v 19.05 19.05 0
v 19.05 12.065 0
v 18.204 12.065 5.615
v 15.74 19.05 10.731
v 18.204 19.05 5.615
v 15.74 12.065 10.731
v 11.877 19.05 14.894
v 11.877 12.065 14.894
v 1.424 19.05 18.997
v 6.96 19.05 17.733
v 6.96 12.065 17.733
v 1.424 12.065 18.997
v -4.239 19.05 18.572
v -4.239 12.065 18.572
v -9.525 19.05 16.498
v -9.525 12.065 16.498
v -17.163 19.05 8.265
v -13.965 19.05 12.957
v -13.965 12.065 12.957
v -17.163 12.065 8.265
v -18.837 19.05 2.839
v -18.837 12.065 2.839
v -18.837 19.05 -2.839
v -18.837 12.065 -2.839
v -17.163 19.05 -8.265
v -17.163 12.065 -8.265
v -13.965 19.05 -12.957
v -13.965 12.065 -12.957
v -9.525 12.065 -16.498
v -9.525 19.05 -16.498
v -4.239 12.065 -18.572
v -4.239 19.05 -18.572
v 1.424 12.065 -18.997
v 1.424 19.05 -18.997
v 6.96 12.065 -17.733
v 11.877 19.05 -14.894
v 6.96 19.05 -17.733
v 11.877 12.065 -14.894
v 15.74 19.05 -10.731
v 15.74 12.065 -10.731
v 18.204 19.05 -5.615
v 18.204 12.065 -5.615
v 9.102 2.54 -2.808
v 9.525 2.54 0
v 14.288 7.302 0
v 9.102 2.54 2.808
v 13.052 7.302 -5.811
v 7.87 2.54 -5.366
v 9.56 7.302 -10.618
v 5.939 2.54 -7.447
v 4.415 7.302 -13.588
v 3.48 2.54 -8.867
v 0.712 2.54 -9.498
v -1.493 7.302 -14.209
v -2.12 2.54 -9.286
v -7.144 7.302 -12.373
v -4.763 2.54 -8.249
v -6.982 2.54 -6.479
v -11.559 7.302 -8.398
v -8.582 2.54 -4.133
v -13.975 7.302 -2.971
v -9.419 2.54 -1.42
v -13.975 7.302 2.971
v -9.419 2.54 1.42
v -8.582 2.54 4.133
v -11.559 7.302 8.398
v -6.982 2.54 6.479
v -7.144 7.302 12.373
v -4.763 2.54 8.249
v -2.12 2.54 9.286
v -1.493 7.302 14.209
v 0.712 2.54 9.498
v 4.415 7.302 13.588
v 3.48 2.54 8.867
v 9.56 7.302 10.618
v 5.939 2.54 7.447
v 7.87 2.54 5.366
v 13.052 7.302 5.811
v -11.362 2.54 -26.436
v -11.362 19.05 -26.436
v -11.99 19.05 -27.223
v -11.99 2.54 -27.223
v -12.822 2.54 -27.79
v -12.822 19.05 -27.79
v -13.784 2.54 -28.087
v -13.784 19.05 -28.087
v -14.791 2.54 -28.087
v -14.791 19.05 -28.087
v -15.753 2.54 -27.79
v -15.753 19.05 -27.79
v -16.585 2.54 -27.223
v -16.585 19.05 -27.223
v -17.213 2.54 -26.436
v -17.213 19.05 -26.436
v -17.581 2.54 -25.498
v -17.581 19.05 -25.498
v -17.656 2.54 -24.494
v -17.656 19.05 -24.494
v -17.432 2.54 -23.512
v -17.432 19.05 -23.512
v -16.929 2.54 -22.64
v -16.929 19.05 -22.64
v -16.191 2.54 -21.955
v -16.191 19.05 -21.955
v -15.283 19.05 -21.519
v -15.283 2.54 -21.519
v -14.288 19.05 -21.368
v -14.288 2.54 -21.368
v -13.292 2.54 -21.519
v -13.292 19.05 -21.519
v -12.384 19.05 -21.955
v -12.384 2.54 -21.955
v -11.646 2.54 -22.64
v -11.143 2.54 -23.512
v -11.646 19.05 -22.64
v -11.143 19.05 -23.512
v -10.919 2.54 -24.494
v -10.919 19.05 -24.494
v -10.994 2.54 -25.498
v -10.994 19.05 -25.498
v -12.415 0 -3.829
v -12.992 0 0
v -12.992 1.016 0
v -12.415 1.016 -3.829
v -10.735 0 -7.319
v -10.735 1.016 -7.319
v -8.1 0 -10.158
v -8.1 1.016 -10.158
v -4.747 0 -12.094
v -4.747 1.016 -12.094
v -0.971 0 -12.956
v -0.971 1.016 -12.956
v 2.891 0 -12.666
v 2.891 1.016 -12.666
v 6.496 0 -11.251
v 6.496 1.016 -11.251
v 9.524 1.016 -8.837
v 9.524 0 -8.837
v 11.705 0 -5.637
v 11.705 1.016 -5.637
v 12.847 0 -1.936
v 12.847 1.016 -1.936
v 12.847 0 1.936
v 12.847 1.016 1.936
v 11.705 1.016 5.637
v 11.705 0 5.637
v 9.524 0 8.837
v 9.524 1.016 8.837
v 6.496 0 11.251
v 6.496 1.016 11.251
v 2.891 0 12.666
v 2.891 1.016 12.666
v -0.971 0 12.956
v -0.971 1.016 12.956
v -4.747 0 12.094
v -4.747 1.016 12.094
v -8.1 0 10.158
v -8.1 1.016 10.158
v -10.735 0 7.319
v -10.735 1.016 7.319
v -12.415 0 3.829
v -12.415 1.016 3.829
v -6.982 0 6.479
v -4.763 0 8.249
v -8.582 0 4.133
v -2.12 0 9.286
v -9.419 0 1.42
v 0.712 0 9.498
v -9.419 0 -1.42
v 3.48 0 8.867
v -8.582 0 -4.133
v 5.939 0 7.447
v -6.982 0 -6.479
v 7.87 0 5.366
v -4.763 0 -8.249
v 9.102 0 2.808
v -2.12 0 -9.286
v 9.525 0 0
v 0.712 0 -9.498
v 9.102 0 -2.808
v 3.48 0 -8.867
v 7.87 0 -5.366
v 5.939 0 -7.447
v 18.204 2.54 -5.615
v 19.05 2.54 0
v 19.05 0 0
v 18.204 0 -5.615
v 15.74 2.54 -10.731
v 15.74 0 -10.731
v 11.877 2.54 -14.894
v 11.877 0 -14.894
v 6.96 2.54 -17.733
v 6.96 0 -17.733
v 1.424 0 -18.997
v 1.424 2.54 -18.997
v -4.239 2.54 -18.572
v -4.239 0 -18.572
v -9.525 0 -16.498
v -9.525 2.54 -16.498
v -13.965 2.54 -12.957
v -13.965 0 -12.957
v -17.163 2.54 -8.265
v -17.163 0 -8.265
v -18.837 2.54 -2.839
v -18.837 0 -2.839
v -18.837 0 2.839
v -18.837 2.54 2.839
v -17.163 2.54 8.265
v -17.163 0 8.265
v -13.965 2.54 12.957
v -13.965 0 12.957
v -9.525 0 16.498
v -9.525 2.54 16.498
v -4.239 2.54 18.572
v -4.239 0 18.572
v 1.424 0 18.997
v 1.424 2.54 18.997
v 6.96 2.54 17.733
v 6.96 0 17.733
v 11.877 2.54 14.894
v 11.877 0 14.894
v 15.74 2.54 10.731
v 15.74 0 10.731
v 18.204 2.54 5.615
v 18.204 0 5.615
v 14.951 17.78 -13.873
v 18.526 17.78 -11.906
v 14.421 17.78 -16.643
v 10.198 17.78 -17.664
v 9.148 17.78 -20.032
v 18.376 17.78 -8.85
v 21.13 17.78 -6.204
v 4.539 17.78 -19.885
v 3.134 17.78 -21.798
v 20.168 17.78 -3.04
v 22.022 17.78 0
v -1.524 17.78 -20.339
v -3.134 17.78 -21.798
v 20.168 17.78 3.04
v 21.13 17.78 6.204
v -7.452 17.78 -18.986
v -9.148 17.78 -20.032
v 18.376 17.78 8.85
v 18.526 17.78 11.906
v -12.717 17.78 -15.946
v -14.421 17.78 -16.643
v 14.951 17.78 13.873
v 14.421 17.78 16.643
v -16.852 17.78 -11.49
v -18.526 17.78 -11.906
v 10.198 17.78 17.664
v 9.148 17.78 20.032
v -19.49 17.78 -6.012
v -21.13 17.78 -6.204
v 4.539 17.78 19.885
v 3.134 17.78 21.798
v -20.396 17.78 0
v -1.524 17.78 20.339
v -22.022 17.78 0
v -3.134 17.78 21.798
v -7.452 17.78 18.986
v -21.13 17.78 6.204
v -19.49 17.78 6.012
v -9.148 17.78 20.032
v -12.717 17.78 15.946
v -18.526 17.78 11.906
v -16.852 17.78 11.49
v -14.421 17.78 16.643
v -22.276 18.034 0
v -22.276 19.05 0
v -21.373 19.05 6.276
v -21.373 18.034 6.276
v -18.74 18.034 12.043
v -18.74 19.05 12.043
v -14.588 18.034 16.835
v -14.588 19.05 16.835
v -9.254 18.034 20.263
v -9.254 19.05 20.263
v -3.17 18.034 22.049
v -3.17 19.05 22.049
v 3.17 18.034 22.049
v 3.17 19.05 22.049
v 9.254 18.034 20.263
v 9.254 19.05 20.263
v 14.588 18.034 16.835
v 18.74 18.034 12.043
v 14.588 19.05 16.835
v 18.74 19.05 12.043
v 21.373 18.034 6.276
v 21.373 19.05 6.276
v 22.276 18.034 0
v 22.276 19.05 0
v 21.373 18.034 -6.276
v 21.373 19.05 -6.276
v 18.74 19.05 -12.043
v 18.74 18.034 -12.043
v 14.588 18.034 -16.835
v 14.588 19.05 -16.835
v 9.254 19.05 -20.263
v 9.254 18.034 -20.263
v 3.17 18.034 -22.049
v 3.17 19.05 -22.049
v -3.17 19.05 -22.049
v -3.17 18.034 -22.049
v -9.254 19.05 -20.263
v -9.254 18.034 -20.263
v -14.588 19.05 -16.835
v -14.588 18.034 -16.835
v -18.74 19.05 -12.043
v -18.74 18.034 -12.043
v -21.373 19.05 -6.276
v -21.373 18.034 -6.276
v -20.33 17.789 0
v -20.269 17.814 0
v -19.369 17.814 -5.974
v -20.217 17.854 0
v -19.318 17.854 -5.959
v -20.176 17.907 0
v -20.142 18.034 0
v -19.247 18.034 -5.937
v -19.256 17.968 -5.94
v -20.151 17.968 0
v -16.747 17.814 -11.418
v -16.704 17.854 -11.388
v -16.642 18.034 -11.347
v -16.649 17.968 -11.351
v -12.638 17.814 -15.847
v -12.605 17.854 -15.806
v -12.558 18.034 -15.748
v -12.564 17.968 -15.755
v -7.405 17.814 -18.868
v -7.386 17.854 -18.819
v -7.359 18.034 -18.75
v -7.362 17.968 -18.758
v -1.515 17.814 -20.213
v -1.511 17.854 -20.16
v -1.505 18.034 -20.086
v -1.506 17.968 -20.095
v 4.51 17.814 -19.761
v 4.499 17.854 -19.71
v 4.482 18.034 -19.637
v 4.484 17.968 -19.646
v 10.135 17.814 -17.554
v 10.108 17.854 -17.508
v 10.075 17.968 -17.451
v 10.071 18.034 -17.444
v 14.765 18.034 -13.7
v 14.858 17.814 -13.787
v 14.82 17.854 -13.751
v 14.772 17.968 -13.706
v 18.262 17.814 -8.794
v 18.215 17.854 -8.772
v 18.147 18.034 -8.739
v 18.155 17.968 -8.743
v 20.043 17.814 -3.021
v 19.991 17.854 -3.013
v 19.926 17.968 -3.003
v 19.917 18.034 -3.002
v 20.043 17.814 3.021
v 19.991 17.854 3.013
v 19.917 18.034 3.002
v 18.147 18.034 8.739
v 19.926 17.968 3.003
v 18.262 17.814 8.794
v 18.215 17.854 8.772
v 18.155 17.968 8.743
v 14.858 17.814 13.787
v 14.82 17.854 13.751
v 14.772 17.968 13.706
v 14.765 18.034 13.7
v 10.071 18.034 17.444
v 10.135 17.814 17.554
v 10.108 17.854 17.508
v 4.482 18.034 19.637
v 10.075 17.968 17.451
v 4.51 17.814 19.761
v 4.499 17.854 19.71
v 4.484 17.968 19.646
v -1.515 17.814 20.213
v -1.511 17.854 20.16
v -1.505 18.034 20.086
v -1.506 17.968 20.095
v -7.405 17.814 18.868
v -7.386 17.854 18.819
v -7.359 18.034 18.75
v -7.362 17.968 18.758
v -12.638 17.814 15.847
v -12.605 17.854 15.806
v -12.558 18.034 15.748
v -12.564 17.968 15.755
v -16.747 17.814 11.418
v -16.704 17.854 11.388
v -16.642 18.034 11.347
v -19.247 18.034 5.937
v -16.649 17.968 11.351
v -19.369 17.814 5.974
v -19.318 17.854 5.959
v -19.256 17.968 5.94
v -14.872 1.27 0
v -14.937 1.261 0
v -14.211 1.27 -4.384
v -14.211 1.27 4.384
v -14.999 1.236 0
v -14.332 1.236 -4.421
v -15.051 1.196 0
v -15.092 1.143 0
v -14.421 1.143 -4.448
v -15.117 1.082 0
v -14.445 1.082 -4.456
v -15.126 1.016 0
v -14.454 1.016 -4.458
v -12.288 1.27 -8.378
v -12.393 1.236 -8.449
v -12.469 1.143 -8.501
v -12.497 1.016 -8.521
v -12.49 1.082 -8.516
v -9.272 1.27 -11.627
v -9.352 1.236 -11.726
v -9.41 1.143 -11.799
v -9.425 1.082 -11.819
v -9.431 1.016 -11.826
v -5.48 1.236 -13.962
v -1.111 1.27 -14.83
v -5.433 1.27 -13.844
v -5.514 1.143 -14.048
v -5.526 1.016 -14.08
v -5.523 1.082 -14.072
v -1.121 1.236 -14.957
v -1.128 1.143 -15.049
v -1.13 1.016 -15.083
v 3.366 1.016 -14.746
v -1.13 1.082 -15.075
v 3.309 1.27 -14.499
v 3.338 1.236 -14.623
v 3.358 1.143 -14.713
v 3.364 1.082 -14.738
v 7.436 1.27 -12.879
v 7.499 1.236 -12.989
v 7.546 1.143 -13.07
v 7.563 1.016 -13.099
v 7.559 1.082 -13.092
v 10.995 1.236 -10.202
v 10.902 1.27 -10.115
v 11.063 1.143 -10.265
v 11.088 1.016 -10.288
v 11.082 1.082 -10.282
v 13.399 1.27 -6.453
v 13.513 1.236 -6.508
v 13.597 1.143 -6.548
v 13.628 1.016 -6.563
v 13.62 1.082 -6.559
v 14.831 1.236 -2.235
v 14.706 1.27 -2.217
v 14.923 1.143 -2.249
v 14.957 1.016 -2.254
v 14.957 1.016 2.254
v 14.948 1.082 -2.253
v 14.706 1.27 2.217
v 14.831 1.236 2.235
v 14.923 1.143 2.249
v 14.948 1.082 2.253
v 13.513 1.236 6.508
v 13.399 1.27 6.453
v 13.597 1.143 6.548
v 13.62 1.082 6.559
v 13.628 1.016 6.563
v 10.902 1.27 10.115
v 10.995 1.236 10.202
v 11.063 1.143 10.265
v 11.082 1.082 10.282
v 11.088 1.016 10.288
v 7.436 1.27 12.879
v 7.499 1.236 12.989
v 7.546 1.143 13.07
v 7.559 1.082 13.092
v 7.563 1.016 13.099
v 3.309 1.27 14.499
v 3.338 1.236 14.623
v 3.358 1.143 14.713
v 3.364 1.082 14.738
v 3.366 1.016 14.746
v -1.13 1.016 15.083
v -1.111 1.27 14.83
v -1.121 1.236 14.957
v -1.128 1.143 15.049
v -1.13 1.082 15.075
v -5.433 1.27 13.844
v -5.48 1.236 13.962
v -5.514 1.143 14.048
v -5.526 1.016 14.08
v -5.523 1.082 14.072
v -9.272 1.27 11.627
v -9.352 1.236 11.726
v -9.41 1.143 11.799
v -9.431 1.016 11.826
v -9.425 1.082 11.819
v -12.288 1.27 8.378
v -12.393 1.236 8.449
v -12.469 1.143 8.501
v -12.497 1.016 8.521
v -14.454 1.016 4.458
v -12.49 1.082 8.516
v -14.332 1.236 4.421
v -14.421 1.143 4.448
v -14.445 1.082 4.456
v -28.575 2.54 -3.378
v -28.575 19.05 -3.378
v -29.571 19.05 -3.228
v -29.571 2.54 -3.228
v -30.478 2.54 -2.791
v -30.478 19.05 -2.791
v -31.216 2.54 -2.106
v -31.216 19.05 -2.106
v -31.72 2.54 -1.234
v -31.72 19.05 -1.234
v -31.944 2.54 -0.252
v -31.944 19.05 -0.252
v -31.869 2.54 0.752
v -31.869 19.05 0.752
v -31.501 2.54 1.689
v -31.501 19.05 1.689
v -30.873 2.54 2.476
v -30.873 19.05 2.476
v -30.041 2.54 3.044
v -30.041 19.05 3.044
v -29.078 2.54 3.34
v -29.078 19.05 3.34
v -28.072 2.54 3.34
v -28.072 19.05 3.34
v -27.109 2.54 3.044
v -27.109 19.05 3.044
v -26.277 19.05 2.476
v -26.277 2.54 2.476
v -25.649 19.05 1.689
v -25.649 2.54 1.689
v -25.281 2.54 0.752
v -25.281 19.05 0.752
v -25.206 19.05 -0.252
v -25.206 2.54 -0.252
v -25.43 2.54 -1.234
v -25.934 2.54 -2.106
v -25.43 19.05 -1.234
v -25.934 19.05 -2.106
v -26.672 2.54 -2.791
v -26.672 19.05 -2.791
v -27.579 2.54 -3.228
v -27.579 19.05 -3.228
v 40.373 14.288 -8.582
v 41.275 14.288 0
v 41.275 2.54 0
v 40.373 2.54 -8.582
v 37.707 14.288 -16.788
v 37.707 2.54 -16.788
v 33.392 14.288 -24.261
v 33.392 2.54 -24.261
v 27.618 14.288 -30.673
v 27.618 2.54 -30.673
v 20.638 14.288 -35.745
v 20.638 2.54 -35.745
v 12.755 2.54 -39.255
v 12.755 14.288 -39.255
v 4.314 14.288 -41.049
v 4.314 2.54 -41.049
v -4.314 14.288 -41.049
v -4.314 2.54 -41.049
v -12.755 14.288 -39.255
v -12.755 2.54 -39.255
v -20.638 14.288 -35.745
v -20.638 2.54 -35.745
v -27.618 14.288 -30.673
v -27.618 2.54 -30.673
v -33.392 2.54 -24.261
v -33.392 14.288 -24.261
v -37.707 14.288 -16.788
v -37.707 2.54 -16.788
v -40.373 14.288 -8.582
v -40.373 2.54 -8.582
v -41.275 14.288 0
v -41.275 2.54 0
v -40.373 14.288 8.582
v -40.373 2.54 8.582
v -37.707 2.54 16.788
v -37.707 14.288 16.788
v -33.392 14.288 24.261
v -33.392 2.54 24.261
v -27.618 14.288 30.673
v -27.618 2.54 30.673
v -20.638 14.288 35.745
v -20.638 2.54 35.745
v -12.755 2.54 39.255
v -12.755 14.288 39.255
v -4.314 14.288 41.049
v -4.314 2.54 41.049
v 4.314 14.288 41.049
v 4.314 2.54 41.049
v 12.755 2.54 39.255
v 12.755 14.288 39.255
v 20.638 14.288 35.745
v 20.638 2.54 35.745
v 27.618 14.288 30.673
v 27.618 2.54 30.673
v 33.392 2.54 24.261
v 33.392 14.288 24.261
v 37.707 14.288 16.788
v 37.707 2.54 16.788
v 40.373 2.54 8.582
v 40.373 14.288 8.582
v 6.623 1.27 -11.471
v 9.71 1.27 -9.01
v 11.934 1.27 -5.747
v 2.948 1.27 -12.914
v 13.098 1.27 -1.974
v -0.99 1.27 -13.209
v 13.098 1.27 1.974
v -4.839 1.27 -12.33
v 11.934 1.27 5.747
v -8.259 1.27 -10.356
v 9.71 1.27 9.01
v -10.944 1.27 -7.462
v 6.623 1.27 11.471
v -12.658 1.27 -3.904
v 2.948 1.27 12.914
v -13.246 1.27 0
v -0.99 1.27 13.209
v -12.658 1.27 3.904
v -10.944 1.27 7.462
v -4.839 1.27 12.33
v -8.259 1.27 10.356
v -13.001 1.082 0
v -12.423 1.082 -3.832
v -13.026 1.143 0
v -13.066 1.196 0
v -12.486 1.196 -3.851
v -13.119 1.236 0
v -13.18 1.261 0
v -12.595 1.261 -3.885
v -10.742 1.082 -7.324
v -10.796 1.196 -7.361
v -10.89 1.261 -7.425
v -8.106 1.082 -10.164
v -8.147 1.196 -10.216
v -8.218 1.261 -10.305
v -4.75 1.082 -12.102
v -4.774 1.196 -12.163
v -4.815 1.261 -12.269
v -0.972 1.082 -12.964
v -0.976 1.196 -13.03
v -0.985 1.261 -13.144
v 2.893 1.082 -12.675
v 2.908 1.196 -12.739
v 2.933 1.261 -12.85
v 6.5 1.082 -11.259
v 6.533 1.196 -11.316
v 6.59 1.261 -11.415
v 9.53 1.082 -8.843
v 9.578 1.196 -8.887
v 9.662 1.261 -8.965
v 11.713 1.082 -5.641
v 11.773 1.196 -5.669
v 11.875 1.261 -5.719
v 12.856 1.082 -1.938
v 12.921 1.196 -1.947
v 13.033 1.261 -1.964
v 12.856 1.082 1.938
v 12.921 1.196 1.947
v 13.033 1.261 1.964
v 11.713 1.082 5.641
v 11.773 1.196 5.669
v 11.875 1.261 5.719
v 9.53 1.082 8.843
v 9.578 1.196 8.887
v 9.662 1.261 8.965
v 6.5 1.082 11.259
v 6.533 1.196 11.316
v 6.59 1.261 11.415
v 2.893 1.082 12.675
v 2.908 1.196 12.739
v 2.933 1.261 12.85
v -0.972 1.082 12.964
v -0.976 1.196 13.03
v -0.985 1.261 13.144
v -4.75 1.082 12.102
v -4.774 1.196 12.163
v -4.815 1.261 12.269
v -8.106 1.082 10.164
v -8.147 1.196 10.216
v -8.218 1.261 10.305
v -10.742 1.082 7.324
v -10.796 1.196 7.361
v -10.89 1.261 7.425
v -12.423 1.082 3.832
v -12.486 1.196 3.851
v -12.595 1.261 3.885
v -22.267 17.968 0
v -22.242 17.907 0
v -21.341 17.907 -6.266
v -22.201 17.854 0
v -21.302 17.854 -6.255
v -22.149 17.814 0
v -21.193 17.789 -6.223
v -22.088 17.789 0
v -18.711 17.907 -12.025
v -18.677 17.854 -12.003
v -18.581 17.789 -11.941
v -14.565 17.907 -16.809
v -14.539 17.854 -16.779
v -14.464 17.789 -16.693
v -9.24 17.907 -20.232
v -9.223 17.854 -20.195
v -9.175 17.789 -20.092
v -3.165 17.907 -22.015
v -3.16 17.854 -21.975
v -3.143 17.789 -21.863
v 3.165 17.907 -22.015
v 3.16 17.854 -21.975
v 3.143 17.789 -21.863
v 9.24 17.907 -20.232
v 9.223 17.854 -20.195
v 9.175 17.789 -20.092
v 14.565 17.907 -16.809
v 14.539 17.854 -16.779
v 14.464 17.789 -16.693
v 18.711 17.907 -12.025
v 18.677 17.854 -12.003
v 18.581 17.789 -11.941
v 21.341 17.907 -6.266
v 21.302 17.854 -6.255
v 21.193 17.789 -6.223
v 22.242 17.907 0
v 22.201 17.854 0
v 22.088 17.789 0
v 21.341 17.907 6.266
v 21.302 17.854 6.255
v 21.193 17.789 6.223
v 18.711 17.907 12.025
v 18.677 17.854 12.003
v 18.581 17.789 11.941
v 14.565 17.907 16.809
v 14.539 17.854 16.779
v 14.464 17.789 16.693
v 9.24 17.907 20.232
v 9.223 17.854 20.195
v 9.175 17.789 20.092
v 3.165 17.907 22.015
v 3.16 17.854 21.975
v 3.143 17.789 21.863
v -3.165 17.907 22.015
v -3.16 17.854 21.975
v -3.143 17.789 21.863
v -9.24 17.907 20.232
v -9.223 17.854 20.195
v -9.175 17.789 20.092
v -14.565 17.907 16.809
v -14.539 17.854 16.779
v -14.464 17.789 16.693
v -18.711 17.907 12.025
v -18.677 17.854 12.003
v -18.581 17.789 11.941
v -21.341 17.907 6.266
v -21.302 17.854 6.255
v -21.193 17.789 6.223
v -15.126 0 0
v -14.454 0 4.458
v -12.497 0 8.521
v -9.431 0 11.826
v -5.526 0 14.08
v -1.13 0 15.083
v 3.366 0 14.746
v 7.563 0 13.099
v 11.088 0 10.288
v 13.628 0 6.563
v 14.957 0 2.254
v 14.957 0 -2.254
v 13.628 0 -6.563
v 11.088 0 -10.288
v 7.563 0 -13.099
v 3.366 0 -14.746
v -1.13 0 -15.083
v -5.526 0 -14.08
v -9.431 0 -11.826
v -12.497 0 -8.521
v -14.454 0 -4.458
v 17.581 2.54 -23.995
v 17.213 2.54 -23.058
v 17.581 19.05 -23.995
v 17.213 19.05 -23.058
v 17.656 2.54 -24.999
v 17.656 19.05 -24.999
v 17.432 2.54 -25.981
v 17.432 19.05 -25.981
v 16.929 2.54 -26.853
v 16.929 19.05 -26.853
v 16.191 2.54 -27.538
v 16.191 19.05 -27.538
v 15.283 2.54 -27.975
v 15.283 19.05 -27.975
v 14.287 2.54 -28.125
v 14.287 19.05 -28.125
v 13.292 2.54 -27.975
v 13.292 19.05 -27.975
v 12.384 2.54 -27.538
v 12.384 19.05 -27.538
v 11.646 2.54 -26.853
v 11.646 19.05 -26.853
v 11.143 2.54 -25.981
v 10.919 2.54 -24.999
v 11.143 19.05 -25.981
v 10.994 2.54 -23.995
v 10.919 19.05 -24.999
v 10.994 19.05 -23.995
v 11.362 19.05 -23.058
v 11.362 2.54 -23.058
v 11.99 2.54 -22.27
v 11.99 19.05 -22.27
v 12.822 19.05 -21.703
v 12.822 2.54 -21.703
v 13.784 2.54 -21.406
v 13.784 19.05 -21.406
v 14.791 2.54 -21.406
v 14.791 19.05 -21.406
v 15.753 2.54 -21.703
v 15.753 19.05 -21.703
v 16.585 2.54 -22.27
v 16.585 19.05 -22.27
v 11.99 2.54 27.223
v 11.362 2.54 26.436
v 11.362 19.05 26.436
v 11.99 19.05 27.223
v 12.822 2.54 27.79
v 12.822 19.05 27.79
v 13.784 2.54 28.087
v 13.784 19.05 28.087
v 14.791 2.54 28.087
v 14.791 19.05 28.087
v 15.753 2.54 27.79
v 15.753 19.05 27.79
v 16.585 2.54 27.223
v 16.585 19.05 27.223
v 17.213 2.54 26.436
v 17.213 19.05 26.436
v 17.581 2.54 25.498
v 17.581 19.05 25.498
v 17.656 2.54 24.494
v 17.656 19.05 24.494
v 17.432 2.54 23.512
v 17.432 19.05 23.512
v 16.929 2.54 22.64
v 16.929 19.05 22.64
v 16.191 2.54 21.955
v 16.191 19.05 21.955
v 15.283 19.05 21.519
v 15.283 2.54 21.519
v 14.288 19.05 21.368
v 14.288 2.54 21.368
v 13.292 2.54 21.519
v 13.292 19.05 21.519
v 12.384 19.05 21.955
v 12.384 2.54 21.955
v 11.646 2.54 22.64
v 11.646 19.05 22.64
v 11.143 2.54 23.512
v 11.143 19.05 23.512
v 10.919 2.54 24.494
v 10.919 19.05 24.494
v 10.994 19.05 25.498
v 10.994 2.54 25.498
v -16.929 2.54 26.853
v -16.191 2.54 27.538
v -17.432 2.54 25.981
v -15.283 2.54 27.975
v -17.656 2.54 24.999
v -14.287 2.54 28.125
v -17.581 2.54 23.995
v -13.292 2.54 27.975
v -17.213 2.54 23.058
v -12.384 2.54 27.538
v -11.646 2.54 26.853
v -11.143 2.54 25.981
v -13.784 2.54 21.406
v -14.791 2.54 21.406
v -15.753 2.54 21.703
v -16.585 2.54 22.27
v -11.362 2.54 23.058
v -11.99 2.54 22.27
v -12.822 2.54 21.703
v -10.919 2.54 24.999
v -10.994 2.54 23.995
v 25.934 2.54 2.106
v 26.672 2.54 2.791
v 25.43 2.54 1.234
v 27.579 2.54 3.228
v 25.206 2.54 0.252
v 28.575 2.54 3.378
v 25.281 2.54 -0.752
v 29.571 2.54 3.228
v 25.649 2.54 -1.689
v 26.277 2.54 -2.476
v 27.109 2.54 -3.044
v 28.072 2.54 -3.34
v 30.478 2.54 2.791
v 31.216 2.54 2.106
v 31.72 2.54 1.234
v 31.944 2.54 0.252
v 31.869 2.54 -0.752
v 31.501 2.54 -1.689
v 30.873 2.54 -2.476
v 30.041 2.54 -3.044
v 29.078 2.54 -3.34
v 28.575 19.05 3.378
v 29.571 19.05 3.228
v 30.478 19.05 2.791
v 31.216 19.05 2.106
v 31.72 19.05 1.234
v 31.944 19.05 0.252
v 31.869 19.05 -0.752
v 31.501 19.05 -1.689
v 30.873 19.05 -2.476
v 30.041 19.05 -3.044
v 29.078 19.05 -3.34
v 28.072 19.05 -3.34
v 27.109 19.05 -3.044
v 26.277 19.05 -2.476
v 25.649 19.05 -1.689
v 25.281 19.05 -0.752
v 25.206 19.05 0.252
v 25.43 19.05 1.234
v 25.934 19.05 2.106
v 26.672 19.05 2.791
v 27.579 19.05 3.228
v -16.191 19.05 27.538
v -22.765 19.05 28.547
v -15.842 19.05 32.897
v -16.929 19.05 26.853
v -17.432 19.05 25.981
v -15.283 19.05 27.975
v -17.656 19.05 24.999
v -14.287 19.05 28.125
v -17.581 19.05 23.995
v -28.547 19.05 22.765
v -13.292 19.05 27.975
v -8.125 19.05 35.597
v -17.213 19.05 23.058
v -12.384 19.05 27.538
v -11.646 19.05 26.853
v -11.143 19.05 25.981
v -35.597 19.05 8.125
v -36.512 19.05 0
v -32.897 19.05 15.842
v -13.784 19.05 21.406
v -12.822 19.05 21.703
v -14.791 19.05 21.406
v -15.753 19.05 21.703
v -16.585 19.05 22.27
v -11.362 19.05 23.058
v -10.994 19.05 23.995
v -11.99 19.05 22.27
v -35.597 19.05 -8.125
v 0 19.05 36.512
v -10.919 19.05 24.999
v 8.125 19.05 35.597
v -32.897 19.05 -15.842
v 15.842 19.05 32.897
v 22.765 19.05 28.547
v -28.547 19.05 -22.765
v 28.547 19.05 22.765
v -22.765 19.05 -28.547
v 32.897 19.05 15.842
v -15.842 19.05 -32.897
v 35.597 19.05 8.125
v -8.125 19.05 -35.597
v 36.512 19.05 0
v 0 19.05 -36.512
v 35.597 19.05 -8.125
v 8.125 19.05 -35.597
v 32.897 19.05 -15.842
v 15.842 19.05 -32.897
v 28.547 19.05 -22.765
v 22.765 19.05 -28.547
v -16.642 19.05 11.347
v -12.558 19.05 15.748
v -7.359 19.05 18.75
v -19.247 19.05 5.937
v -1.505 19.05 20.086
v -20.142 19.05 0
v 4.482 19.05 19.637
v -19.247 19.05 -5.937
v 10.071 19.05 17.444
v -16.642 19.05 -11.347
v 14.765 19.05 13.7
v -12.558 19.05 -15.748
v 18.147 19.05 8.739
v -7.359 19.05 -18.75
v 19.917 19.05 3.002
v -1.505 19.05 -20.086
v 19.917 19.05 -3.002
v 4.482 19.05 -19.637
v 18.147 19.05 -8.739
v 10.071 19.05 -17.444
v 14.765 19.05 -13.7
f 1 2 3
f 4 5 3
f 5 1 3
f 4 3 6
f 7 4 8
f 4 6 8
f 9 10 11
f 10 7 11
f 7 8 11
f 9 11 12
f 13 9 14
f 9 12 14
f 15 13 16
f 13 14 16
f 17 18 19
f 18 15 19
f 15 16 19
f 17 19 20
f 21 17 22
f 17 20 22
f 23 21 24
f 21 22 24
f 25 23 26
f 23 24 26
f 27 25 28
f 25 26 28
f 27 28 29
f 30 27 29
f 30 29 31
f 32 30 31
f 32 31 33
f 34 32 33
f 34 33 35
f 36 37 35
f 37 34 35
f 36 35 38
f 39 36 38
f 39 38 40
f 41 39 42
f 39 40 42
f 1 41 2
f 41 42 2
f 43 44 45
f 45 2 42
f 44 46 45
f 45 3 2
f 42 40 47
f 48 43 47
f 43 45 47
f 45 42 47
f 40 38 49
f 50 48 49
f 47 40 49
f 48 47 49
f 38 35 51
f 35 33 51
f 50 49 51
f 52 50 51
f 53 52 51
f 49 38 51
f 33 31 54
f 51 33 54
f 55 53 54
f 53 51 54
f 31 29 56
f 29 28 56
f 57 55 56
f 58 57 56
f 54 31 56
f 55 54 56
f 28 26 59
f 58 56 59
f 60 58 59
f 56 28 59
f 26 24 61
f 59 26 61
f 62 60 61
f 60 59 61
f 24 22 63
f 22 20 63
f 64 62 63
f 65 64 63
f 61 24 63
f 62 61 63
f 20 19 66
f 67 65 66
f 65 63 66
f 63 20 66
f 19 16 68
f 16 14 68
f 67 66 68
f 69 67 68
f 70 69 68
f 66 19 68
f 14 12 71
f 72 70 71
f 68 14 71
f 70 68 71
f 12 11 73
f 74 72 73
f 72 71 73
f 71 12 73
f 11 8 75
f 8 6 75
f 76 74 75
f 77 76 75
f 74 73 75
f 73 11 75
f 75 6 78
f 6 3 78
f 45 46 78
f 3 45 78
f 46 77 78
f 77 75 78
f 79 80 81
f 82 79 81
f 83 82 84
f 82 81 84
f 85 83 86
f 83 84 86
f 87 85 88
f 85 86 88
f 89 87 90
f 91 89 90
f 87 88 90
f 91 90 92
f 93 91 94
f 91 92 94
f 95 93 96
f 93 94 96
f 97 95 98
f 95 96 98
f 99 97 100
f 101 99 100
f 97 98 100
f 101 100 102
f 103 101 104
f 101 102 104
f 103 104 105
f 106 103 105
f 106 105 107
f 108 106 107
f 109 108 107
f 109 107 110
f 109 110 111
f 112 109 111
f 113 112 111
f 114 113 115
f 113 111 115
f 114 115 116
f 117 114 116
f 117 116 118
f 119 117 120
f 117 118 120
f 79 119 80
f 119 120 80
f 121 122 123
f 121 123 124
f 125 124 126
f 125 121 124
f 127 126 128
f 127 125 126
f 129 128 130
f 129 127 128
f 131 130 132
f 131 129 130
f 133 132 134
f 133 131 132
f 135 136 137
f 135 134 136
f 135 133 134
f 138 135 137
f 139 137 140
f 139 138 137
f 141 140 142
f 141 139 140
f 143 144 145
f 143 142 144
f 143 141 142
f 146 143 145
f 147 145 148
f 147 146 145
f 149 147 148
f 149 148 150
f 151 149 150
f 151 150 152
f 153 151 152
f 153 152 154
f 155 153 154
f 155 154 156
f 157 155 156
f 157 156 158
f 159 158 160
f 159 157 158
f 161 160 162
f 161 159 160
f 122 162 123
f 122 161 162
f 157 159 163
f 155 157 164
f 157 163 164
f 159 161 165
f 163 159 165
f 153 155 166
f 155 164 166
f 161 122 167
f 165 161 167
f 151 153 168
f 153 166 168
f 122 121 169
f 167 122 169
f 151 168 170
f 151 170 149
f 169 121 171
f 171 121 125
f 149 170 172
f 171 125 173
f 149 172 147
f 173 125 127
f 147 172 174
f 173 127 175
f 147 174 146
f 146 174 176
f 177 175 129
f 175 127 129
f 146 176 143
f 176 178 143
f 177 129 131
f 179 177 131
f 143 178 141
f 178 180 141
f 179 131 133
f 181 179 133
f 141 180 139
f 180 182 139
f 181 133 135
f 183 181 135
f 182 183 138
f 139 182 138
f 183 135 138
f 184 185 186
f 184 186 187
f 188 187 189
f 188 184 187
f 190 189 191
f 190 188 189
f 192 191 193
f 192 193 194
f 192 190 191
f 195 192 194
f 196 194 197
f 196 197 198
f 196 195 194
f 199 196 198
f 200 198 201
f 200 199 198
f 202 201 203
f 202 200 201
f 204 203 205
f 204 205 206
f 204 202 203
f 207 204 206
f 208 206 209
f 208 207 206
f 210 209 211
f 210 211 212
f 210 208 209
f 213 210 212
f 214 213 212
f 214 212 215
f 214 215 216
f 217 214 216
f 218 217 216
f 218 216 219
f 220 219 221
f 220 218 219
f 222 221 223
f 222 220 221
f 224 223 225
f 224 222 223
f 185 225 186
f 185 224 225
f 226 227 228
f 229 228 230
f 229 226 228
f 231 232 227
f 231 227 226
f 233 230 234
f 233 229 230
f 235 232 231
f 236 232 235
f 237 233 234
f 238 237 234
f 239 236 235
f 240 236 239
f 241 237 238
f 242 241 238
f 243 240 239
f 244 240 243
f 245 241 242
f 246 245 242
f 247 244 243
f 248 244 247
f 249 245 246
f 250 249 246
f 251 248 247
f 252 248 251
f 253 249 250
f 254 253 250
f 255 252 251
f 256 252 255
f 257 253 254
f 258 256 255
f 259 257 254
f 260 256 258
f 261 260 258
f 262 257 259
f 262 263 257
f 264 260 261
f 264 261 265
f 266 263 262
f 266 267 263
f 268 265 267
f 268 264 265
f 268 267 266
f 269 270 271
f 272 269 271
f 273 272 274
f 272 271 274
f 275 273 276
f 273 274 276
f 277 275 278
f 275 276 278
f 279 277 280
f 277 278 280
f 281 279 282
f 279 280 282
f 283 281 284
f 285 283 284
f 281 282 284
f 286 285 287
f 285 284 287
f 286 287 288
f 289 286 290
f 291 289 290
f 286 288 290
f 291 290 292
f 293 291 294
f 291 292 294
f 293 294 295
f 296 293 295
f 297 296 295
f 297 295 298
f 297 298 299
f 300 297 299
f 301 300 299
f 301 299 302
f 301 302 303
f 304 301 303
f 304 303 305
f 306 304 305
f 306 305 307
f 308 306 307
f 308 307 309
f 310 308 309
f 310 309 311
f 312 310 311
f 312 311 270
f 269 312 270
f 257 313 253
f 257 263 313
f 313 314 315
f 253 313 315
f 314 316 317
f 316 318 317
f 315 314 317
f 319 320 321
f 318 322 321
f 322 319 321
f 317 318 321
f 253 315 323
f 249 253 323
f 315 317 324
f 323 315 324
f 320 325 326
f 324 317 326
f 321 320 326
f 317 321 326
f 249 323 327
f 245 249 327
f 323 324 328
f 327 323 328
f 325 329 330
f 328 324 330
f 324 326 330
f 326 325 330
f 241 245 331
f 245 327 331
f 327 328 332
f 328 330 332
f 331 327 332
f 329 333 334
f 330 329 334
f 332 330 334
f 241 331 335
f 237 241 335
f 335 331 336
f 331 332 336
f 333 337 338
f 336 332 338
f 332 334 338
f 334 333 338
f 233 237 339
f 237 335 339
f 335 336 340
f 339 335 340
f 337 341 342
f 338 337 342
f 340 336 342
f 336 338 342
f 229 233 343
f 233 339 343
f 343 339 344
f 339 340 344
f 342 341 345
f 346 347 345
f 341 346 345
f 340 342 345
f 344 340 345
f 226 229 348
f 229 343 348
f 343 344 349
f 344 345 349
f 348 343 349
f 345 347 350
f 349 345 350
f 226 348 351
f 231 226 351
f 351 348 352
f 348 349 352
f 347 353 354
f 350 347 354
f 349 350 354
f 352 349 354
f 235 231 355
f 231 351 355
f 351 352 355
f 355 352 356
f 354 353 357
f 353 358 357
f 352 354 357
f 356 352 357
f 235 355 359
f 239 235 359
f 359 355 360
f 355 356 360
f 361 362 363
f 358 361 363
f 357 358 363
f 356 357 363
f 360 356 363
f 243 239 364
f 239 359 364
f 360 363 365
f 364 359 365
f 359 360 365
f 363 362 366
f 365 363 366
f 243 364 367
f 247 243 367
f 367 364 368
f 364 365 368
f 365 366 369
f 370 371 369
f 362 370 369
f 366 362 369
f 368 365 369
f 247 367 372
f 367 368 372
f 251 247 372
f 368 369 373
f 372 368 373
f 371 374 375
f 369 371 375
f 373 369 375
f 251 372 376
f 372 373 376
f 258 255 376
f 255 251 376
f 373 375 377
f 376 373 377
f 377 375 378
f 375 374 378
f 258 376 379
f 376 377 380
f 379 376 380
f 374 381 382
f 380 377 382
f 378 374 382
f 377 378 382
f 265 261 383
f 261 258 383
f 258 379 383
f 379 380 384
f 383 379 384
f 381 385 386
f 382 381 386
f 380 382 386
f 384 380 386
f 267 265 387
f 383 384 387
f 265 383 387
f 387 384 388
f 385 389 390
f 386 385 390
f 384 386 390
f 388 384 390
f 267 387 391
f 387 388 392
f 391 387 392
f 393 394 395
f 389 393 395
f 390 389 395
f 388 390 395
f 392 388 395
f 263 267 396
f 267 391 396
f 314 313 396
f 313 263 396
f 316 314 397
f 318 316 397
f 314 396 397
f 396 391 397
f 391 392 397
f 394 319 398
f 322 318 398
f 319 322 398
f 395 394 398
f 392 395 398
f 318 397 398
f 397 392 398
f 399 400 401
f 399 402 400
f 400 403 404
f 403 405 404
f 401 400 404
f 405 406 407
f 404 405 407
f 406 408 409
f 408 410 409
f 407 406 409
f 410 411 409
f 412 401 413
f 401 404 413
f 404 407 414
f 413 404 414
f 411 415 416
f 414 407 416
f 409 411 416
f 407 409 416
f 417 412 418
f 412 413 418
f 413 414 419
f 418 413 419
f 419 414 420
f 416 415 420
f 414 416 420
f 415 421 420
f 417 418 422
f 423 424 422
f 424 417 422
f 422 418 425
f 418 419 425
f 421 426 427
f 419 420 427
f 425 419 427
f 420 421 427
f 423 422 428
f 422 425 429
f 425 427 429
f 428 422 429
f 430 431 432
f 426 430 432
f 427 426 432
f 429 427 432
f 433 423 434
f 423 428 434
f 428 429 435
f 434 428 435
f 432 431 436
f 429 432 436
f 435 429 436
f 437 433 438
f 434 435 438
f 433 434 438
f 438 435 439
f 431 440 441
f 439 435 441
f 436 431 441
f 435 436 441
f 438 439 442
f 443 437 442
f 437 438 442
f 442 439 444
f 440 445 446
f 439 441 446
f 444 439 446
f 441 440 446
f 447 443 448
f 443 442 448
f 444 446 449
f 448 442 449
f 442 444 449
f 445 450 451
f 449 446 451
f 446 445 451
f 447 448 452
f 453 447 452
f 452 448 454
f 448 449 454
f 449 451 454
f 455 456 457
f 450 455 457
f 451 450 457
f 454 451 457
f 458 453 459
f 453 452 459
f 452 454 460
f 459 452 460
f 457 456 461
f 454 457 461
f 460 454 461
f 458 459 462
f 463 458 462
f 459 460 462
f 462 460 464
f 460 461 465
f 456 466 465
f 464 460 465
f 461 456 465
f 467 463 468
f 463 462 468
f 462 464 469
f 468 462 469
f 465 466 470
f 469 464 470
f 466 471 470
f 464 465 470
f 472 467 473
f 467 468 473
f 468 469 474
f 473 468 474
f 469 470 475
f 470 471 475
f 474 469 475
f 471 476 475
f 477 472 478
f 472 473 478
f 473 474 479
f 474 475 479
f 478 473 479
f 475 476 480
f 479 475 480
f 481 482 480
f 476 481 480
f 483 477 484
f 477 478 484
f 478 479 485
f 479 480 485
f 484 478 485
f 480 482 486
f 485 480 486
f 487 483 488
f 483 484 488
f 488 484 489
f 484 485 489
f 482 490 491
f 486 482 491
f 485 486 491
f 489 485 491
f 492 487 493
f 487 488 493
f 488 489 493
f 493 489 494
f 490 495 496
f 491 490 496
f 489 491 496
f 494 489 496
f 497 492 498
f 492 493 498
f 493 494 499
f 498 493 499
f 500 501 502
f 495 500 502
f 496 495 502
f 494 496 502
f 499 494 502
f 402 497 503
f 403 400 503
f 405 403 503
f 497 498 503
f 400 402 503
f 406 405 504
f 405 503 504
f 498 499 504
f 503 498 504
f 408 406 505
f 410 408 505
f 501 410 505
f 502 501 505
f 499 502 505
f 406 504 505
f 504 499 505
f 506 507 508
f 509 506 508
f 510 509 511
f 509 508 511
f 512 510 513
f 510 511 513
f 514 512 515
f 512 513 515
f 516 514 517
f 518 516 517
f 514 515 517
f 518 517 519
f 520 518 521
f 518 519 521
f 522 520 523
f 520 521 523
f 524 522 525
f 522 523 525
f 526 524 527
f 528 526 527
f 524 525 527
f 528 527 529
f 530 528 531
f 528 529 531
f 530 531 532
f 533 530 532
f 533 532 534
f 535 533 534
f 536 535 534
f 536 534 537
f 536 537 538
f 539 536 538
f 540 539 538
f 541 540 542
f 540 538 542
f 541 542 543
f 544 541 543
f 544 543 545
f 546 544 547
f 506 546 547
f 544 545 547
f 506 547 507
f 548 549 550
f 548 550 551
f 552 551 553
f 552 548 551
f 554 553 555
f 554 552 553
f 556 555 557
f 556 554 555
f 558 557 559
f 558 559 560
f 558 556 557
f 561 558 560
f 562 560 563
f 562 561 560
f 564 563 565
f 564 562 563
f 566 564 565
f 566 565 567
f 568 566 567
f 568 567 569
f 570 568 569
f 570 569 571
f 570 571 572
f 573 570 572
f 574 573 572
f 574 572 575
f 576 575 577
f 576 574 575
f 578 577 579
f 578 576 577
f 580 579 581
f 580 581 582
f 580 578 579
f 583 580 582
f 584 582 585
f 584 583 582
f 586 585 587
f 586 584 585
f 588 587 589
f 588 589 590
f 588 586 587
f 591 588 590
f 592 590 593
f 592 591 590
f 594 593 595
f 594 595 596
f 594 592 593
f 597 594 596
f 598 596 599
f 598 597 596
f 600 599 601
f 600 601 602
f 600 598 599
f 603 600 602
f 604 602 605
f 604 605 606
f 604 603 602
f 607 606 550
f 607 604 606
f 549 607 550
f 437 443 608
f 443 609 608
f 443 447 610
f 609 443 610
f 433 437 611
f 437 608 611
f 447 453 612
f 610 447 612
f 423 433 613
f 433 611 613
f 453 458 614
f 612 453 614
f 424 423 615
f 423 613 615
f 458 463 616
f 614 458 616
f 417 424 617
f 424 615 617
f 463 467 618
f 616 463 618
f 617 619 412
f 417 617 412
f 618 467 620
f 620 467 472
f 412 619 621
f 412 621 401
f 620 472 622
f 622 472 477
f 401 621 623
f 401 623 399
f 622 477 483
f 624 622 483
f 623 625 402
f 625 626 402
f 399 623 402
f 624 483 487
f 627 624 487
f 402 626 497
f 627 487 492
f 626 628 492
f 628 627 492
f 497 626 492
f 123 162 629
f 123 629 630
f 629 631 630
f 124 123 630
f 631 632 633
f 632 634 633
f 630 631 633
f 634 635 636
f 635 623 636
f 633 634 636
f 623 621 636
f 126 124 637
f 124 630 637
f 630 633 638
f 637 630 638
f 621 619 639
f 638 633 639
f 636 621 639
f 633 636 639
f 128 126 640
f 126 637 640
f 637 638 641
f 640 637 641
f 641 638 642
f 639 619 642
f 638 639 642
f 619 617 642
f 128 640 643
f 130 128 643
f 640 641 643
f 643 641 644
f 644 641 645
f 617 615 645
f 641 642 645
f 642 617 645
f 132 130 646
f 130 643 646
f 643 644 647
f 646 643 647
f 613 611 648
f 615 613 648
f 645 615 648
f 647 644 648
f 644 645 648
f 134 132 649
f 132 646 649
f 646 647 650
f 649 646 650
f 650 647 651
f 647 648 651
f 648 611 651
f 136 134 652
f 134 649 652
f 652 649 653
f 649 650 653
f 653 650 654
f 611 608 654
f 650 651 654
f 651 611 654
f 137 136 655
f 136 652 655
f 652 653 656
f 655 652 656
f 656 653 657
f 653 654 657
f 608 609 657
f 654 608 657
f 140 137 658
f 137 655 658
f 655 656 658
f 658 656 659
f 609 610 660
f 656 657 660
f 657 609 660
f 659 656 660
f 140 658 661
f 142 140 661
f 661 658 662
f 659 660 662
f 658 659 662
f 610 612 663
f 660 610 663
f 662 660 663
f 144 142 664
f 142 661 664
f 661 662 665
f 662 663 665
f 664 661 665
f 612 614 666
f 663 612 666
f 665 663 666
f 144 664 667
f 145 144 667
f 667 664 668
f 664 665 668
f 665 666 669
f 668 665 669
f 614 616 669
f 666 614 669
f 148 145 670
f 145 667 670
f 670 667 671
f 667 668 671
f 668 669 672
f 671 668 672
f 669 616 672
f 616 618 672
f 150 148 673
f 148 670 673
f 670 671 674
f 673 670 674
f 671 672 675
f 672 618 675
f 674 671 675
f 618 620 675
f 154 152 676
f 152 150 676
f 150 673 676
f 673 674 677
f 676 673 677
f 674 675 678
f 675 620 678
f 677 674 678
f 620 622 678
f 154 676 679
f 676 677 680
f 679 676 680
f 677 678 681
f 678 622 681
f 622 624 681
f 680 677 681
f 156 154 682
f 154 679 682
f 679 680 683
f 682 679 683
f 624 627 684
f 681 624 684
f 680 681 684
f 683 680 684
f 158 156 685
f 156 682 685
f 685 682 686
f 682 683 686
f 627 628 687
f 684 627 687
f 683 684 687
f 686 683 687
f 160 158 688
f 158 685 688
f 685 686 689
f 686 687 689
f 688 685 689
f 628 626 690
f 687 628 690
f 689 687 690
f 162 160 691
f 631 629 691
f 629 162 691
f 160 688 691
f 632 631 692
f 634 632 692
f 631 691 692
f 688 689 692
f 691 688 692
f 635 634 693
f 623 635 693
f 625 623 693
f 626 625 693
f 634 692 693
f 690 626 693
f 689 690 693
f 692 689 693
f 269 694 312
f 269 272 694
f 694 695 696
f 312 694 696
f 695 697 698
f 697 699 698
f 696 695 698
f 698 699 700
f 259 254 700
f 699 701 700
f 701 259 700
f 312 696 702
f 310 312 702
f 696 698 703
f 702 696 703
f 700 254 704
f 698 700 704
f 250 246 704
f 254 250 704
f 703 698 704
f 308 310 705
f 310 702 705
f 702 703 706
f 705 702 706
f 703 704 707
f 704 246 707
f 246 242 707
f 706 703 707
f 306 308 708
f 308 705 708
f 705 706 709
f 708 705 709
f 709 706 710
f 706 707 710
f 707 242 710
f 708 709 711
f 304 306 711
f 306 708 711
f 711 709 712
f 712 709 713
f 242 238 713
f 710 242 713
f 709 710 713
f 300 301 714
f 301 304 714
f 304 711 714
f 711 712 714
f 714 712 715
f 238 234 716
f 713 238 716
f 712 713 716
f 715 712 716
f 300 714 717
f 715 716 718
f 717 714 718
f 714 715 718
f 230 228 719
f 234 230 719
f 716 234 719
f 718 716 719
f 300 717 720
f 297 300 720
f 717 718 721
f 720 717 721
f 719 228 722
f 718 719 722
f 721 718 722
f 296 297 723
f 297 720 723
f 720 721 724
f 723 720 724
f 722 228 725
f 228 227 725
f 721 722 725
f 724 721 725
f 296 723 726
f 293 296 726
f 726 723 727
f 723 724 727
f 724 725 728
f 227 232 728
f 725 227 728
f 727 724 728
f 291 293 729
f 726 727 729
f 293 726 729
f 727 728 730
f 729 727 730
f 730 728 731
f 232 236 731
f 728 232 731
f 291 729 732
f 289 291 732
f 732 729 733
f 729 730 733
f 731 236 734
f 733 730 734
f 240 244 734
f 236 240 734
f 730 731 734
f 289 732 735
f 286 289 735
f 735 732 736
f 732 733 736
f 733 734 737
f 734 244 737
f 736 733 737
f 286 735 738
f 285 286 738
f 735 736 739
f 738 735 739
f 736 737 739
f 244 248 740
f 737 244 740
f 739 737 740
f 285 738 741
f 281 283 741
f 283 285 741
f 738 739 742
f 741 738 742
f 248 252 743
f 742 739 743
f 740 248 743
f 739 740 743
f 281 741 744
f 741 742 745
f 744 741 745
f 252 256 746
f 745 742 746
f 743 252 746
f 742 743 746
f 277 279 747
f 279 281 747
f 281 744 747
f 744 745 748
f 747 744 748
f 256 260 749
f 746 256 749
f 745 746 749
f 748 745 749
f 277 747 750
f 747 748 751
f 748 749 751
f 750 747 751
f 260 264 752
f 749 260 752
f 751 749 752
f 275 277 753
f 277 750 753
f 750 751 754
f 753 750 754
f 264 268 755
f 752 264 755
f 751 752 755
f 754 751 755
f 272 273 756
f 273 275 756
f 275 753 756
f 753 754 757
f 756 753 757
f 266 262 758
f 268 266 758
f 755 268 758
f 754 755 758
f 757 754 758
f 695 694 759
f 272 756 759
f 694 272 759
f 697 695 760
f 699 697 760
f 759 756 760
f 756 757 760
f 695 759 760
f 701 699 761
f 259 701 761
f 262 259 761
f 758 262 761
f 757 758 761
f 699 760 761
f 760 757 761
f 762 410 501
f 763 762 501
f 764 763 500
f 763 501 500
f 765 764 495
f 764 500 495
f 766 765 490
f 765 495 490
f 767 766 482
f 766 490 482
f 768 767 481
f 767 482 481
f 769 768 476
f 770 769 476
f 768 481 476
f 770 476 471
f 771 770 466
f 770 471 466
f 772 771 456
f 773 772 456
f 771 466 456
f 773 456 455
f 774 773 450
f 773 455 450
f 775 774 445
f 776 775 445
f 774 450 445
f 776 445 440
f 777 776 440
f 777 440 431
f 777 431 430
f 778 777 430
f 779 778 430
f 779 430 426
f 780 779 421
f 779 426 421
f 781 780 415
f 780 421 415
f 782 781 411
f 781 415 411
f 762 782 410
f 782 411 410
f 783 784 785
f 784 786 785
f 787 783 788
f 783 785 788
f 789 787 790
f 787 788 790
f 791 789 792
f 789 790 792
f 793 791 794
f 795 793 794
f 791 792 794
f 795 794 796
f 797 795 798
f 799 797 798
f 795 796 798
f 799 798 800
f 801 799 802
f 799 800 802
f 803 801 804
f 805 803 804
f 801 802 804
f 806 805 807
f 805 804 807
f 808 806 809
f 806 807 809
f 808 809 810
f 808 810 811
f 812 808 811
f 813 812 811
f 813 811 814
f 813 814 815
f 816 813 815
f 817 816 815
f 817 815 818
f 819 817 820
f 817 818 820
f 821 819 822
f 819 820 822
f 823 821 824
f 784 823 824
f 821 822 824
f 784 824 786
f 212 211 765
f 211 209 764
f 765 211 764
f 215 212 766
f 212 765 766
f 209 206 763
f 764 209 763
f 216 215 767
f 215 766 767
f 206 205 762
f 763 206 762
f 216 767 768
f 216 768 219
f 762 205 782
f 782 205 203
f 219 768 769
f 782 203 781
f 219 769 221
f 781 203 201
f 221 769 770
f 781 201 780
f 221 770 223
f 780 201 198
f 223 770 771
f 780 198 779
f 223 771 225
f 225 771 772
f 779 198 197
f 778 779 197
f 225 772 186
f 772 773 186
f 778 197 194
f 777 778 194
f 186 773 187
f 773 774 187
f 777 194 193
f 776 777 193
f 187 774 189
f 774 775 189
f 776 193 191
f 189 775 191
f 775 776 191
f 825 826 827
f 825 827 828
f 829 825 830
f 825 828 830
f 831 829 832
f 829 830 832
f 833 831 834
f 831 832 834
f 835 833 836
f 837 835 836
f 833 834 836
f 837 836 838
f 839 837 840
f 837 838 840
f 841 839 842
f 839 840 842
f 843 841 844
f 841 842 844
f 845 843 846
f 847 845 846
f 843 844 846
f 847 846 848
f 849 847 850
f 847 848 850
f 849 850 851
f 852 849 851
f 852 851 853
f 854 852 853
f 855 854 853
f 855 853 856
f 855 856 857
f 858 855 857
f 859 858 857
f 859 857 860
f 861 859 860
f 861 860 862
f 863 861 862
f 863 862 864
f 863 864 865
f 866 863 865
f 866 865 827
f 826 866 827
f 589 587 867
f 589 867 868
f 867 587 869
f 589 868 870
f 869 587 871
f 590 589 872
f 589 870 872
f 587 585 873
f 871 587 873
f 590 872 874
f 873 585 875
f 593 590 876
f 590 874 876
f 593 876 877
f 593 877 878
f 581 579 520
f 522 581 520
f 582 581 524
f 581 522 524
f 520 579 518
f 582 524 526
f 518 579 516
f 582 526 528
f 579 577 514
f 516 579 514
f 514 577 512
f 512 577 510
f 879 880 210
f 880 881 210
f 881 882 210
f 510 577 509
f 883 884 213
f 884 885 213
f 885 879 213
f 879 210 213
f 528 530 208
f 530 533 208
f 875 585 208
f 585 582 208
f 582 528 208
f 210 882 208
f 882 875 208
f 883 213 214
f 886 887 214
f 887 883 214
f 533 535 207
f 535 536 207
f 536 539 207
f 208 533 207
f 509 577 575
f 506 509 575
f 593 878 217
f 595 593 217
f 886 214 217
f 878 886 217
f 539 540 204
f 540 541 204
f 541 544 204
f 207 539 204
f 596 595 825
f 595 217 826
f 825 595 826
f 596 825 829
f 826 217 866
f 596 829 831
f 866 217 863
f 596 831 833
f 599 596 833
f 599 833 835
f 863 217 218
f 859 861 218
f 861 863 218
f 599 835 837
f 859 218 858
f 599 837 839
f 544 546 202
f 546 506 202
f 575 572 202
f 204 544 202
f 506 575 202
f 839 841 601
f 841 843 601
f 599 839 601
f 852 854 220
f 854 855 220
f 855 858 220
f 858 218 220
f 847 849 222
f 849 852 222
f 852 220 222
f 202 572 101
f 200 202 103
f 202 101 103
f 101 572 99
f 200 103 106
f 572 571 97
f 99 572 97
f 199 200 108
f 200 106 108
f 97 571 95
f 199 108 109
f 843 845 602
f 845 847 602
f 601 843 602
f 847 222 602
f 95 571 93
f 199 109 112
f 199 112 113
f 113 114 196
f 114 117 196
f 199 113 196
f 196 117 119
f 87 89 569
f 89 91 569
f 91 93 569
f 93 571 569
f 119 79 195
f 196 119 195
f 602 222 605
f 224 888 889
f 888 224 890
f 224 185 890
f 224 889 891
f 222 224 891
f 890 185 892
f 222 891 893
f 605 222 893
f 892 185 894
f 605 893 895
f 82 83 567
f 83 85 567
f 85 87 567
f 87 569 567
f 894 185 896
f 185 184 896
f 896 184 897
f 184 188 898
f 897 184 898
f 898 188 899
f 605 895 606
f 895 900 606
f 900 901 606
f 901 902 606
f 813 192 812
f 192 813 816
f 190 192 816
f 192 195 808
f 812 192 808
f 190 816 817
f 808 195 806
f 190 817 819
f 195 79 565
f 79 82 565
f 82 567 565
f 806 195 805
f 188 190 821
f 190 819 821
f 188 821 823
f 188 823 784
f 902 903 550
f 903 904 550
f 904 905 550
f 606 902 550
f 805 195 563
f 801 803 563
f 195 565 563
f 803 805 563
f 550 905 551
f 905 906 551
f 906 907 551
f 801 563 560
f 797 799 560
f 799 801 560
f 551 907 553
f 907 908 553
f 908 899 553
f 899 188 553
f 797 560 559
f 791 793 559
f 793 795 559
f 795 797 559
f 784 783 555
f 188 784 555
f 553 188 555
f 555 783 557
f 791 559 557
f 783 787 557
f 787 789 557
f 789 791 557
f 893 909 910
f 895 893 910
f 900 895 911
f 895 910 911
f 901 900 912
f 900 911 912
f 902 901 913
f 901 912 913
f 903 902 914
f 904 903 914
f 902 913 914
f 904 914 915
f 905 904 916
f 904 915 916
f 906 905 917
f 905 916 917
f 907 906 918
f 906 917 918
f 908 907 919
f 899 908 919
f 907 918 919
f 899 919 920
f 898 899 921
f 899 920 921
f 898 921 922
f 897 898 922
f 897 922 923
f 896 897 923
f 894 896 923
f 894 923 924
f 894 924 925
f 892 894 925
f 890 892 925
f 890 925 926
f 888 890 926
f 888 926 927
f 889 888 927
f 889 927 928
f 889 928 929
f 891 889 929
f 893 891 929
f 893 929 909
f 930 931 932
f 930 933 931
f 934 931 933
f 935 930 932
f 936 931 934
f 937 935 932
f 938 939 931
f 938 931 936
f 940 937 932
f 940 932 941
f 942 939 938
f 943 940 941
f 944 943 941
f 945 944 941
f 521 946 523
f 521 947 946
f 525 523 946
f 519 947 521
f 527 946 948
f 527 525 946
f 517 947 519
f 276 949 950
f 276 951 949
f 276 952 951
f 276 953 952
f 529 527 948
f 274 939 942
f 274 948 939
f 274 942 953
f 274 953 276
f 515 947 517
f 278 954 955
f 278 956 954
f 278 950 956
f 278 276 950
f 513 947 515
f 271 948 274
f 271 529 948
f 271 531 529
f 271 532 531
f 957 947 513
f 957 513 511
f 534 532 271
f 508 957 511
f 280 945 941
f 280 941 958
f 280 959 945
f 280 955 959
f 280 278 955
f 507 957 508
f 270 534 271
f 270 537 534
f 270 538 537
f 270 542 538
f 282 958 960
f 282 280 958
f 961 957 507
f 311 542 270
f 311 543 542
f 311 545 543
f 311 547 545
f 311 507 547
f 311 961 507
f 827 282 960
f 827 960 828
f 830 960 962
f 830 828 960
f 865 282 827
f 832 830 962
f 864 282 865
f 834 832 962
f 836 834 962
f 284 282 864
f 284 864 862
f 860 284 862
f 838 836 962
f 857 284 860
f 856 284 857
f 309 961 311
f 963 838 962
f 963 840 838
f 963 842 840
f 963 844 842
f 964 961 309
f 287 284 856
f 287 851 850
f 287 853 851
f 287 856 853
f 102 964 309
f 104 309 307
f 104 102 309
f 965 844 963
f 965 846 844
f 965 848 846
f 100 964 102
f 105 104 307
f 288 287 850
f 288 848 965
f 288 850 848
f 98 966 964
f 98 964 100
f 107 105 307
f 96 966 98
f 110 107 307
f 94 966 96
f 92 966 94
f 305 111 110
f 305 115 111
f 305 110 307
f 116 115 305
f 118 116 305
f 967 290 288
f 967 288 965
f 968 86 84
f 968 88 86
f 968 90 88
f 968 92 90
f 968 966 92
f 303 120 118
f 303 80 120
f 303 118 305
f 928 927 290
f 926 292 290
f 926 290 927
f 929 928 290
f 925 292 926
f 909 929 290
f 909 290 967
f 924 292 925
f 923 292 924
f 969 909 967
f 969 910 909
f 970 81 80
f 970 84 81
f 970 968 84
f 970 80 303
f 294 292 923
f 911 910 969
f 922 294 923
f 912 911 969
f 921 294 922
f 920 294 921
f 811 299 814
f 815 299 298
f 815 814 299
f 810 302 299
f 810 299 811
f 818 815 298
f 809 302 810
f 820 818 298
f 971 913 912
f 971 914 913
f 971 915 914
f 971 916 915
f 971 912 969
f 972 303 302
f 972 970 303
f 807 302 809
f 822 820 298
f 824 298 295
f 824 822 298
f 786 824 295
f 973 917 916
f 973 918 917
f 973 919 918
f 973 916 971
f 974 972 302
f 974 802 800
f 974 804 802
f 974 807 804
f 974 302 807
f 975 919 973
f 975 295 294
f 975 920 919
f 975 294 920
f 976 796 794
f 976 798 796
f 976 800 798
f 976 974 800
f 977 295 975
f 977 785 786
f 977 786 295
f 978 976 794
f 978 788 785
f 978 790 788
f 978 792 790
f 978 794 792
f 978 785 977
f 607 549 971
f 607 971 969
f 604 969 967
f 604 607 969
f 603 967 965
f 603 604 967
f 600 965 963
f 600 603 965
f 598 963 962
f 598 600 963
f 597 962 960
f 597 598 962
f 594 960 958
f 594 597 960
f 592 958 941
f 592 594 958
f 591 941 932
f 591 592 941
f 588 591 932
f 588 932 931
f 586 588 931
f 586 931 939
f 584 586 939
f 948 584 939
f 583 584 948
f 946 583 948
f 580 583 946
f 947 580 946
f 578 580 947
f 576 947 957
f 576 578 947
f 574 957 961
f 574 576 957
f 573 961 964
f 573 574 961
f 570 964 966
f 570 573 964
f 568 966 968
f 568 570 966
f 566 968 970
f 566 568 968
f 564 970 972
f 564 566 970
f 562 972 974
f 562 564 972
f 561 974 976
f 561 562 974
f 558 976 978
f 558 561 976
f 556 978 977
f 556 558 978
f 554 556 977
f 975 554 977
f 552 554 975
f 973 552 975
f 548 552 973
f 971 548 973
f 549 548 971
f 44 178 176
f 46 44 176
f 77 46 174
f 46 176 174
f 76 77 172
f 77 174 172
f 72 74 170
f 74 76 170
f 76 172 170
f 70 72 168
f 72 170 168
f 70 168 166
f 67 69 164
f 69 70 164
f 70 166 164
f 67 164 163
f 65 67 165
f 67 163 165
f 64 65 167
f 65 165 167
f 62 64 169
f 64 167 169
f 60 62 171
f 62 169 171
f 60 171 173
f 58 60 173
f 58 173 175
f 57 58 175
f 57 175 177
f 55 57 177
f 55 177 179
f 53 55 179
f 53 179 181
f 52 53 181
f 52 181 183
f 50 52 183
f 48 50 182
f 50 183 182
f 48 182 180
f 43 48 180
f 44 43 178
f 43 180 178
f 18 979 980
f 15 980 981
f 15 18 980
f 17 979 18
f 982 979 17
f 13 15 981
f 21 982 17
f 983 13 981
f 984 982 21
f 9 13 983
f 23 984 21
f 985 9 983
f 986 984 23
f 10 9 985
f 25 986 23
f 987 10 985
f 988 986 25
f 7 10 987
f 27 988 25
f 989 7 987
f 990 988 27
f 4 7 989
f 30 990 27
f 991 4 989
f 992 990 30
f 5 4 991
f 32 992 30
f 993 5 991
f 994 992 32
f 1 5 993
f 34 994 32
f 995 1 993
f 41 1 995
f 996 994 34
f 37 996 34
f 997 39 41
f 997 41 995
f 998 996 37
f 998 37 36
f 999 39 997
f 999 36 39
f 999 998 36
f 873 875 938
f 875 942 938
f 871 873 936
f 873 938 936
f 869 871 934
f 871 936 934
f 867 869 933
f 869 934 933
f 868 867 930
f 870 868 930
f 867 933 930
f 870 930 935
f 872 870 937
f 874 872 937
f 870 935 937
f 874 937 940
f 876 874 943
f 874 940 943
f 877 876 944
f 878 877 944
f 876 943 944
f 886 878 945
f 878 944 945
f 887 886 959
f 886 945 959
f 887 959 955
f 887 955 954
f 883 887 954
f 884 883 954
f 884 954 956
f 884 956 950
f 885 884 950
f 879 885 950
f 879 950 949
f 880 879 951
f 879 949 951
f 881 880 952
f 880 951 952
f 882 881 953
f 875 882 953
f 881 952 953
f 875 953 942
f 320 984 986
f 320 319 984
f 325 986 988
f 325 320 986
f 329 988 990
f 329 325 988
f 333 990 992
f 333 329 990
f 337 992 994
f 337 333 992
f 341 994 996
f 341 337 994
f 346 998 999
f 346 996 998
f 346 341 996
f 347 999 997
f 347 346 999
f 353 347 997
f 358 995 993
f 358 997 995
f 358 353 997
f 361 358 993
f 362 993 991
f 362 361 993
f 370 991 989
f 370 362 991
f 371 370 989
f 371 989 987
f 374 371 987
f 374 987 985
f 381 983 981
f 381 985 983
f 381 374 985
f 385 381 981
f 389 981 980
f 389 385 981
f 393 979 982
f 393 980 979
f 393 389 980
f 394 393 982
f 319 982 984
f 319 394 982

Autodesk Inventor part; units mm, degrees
ref_plane "YZ Plane" through (0, 0, 0) normal (1, 0, 0) x (0, 1, 0)
ref_plane "XZ Plane" through (0, 0, 0) normal (0, 1, 0) x (-1, 0, 0)
ref_plane "XY Plane" through (0, 0, 0) normal (0, 0, 1) x (1, 0, 0)
sketch "Sketch1" plane through (0, 0, 0) normal (0, 0, 1) x (1, 0, 0)
  line L0 (9.525, 0) -> (19.05, 0)
  line L1 (41.275, 19.05) -> (19.05, 19.05)
  line L2 (19.05, 19.05) -> (19.05, 12.065)
  line L3 (19.05, 12.065) -> (9.525, 2.54)
  line L4 (9.525, 2.54) -> (9.525, 0)
  line L5 (0, -3.81) -> (0, 22.86) projected
  line L6 (19.05, 0) -> (19.05, 2.54)
  line L7 (19.05, 2.54) -> (41.275, 2.54)
  line L8 (41.275, 2.54) -> (41.275, 19.05)
  point P0 (0, 0)
  dimension "d37" = 45
  dimension "d40" = 2.54
  dimension "d57" = 19.05
  dimension "d58" = 9.525
  dimension "d59" = 19.05
  dimension "d60" = 41.275
  dimension "d61" = 2.54
  dimension "d62" = 19.05
revolve "Revolution1" add sketch "Sketch1" angle 360 about axis through (0, -10, 0) along (0, 1, 0)
sketch "Sketch4" plane through (0, 0, 0) normal (0, -1, 0) x (1, 0, 0)
  point P0 (0, 0)
  point P1 (-28.575, 0)
  dimension "d50" = 28.575
hole "Hole2" at (-28.575, 0, 0) direction (0, 1, 0) diameter 6.7564 end through all clearance for "Socket Head Cap Screw" size "1/4" standard "Ansi Unified Screw Threads"
pattern_circular "Circular Pattern3" count 6 over 360 about axis through (0, 1.27, 0) along (0, -1, 0) of "Hole2"
chamfer "Chamfer3" distance 4.7625 angle 45 1 edges at (-41.275, 19.05, 0)
sketch "Sketch8" plane through (0, 0, 0) normal (0, 0, 1) x (1, 0, 0)
  line L0 (-22.2758, 19.05) -> (-20.1422, 19.05)
  line L1 (-20.1422, 19.05) -> (-20.1422, 18.034)
  line L2 (-20.3962, 17.78) -> (-22.0218, 17.78)
  line L3 (-22.2758, 18.034) -> (-22.2758, 19.05)
  line L4 (0, -5.1288) -> (0, 30.7731) projected
  arc A0 (-22.2758, 18.034) -> (-22.0218, 17.78) centre (-22.0218, 18.034) ccw
  arc A1 (-20.3962, 17.78) -> (-20.1422, 18.034) centre (-20.3962, 18.034) ccw
  line L5 (-19.05, 19.05) -> (19.05, 19.05) projected
  point P0 (0, 0)
  point P1 (-22.2758, 17.78)
  dimension "d88" = 1.27
  dimension "d90" = 22.2758
  dimension "d91" = 2.1336
  dimension "d92" = 0.254
  dimension "d93" = 0.254
  dimension "d94" = 0
revolve "Revolution5" cut sketch "Sketch8" angle 360 about axis through (0, -10, 0) along (0, 1, 0)
sketch "Sketch9" plane through (0, 0, 0) normal (0, 0, 1) x (1, 0, 0)
  line L0 (-14.8717, 1.27) -> (-13.2461, 1.27)
  line L1 (-12.9921, 1.016) -> (-12.9921, 0)
  line L2 (-12.9921, 0) -> (-15.1257, 0)
  line L3 (-15.1257, 0) -> (-15.1257, 1.016)
  arc A0 (-14.8717, 1.27) -> (-15.1257, 1.016) centre (-14.8717, 1.016) ccw
  arc A1 (-12.9921, 1.016) -> (-13.2461, 1.27) centre (-13.2461, 1.016) ccw
  line L4 (0, -3.81) -> (0, 22.86) projected
  line L5 (0, -15.7794) -> (0, 28.2703) construction
  point P0 (0, 0)
  dimension "d96" = 15.1257
  dimension "d97" = 0.254
  dimension "d98" = 1.27
  dimension "d99" = 2.1336
revolve "Revolution6" cut sketch "Sketch9" angle 360 about axis through (0, -10, 0) along (0, 1, 0)
properties part number "ODSY-0003-202" material "Aluminum 6061"
